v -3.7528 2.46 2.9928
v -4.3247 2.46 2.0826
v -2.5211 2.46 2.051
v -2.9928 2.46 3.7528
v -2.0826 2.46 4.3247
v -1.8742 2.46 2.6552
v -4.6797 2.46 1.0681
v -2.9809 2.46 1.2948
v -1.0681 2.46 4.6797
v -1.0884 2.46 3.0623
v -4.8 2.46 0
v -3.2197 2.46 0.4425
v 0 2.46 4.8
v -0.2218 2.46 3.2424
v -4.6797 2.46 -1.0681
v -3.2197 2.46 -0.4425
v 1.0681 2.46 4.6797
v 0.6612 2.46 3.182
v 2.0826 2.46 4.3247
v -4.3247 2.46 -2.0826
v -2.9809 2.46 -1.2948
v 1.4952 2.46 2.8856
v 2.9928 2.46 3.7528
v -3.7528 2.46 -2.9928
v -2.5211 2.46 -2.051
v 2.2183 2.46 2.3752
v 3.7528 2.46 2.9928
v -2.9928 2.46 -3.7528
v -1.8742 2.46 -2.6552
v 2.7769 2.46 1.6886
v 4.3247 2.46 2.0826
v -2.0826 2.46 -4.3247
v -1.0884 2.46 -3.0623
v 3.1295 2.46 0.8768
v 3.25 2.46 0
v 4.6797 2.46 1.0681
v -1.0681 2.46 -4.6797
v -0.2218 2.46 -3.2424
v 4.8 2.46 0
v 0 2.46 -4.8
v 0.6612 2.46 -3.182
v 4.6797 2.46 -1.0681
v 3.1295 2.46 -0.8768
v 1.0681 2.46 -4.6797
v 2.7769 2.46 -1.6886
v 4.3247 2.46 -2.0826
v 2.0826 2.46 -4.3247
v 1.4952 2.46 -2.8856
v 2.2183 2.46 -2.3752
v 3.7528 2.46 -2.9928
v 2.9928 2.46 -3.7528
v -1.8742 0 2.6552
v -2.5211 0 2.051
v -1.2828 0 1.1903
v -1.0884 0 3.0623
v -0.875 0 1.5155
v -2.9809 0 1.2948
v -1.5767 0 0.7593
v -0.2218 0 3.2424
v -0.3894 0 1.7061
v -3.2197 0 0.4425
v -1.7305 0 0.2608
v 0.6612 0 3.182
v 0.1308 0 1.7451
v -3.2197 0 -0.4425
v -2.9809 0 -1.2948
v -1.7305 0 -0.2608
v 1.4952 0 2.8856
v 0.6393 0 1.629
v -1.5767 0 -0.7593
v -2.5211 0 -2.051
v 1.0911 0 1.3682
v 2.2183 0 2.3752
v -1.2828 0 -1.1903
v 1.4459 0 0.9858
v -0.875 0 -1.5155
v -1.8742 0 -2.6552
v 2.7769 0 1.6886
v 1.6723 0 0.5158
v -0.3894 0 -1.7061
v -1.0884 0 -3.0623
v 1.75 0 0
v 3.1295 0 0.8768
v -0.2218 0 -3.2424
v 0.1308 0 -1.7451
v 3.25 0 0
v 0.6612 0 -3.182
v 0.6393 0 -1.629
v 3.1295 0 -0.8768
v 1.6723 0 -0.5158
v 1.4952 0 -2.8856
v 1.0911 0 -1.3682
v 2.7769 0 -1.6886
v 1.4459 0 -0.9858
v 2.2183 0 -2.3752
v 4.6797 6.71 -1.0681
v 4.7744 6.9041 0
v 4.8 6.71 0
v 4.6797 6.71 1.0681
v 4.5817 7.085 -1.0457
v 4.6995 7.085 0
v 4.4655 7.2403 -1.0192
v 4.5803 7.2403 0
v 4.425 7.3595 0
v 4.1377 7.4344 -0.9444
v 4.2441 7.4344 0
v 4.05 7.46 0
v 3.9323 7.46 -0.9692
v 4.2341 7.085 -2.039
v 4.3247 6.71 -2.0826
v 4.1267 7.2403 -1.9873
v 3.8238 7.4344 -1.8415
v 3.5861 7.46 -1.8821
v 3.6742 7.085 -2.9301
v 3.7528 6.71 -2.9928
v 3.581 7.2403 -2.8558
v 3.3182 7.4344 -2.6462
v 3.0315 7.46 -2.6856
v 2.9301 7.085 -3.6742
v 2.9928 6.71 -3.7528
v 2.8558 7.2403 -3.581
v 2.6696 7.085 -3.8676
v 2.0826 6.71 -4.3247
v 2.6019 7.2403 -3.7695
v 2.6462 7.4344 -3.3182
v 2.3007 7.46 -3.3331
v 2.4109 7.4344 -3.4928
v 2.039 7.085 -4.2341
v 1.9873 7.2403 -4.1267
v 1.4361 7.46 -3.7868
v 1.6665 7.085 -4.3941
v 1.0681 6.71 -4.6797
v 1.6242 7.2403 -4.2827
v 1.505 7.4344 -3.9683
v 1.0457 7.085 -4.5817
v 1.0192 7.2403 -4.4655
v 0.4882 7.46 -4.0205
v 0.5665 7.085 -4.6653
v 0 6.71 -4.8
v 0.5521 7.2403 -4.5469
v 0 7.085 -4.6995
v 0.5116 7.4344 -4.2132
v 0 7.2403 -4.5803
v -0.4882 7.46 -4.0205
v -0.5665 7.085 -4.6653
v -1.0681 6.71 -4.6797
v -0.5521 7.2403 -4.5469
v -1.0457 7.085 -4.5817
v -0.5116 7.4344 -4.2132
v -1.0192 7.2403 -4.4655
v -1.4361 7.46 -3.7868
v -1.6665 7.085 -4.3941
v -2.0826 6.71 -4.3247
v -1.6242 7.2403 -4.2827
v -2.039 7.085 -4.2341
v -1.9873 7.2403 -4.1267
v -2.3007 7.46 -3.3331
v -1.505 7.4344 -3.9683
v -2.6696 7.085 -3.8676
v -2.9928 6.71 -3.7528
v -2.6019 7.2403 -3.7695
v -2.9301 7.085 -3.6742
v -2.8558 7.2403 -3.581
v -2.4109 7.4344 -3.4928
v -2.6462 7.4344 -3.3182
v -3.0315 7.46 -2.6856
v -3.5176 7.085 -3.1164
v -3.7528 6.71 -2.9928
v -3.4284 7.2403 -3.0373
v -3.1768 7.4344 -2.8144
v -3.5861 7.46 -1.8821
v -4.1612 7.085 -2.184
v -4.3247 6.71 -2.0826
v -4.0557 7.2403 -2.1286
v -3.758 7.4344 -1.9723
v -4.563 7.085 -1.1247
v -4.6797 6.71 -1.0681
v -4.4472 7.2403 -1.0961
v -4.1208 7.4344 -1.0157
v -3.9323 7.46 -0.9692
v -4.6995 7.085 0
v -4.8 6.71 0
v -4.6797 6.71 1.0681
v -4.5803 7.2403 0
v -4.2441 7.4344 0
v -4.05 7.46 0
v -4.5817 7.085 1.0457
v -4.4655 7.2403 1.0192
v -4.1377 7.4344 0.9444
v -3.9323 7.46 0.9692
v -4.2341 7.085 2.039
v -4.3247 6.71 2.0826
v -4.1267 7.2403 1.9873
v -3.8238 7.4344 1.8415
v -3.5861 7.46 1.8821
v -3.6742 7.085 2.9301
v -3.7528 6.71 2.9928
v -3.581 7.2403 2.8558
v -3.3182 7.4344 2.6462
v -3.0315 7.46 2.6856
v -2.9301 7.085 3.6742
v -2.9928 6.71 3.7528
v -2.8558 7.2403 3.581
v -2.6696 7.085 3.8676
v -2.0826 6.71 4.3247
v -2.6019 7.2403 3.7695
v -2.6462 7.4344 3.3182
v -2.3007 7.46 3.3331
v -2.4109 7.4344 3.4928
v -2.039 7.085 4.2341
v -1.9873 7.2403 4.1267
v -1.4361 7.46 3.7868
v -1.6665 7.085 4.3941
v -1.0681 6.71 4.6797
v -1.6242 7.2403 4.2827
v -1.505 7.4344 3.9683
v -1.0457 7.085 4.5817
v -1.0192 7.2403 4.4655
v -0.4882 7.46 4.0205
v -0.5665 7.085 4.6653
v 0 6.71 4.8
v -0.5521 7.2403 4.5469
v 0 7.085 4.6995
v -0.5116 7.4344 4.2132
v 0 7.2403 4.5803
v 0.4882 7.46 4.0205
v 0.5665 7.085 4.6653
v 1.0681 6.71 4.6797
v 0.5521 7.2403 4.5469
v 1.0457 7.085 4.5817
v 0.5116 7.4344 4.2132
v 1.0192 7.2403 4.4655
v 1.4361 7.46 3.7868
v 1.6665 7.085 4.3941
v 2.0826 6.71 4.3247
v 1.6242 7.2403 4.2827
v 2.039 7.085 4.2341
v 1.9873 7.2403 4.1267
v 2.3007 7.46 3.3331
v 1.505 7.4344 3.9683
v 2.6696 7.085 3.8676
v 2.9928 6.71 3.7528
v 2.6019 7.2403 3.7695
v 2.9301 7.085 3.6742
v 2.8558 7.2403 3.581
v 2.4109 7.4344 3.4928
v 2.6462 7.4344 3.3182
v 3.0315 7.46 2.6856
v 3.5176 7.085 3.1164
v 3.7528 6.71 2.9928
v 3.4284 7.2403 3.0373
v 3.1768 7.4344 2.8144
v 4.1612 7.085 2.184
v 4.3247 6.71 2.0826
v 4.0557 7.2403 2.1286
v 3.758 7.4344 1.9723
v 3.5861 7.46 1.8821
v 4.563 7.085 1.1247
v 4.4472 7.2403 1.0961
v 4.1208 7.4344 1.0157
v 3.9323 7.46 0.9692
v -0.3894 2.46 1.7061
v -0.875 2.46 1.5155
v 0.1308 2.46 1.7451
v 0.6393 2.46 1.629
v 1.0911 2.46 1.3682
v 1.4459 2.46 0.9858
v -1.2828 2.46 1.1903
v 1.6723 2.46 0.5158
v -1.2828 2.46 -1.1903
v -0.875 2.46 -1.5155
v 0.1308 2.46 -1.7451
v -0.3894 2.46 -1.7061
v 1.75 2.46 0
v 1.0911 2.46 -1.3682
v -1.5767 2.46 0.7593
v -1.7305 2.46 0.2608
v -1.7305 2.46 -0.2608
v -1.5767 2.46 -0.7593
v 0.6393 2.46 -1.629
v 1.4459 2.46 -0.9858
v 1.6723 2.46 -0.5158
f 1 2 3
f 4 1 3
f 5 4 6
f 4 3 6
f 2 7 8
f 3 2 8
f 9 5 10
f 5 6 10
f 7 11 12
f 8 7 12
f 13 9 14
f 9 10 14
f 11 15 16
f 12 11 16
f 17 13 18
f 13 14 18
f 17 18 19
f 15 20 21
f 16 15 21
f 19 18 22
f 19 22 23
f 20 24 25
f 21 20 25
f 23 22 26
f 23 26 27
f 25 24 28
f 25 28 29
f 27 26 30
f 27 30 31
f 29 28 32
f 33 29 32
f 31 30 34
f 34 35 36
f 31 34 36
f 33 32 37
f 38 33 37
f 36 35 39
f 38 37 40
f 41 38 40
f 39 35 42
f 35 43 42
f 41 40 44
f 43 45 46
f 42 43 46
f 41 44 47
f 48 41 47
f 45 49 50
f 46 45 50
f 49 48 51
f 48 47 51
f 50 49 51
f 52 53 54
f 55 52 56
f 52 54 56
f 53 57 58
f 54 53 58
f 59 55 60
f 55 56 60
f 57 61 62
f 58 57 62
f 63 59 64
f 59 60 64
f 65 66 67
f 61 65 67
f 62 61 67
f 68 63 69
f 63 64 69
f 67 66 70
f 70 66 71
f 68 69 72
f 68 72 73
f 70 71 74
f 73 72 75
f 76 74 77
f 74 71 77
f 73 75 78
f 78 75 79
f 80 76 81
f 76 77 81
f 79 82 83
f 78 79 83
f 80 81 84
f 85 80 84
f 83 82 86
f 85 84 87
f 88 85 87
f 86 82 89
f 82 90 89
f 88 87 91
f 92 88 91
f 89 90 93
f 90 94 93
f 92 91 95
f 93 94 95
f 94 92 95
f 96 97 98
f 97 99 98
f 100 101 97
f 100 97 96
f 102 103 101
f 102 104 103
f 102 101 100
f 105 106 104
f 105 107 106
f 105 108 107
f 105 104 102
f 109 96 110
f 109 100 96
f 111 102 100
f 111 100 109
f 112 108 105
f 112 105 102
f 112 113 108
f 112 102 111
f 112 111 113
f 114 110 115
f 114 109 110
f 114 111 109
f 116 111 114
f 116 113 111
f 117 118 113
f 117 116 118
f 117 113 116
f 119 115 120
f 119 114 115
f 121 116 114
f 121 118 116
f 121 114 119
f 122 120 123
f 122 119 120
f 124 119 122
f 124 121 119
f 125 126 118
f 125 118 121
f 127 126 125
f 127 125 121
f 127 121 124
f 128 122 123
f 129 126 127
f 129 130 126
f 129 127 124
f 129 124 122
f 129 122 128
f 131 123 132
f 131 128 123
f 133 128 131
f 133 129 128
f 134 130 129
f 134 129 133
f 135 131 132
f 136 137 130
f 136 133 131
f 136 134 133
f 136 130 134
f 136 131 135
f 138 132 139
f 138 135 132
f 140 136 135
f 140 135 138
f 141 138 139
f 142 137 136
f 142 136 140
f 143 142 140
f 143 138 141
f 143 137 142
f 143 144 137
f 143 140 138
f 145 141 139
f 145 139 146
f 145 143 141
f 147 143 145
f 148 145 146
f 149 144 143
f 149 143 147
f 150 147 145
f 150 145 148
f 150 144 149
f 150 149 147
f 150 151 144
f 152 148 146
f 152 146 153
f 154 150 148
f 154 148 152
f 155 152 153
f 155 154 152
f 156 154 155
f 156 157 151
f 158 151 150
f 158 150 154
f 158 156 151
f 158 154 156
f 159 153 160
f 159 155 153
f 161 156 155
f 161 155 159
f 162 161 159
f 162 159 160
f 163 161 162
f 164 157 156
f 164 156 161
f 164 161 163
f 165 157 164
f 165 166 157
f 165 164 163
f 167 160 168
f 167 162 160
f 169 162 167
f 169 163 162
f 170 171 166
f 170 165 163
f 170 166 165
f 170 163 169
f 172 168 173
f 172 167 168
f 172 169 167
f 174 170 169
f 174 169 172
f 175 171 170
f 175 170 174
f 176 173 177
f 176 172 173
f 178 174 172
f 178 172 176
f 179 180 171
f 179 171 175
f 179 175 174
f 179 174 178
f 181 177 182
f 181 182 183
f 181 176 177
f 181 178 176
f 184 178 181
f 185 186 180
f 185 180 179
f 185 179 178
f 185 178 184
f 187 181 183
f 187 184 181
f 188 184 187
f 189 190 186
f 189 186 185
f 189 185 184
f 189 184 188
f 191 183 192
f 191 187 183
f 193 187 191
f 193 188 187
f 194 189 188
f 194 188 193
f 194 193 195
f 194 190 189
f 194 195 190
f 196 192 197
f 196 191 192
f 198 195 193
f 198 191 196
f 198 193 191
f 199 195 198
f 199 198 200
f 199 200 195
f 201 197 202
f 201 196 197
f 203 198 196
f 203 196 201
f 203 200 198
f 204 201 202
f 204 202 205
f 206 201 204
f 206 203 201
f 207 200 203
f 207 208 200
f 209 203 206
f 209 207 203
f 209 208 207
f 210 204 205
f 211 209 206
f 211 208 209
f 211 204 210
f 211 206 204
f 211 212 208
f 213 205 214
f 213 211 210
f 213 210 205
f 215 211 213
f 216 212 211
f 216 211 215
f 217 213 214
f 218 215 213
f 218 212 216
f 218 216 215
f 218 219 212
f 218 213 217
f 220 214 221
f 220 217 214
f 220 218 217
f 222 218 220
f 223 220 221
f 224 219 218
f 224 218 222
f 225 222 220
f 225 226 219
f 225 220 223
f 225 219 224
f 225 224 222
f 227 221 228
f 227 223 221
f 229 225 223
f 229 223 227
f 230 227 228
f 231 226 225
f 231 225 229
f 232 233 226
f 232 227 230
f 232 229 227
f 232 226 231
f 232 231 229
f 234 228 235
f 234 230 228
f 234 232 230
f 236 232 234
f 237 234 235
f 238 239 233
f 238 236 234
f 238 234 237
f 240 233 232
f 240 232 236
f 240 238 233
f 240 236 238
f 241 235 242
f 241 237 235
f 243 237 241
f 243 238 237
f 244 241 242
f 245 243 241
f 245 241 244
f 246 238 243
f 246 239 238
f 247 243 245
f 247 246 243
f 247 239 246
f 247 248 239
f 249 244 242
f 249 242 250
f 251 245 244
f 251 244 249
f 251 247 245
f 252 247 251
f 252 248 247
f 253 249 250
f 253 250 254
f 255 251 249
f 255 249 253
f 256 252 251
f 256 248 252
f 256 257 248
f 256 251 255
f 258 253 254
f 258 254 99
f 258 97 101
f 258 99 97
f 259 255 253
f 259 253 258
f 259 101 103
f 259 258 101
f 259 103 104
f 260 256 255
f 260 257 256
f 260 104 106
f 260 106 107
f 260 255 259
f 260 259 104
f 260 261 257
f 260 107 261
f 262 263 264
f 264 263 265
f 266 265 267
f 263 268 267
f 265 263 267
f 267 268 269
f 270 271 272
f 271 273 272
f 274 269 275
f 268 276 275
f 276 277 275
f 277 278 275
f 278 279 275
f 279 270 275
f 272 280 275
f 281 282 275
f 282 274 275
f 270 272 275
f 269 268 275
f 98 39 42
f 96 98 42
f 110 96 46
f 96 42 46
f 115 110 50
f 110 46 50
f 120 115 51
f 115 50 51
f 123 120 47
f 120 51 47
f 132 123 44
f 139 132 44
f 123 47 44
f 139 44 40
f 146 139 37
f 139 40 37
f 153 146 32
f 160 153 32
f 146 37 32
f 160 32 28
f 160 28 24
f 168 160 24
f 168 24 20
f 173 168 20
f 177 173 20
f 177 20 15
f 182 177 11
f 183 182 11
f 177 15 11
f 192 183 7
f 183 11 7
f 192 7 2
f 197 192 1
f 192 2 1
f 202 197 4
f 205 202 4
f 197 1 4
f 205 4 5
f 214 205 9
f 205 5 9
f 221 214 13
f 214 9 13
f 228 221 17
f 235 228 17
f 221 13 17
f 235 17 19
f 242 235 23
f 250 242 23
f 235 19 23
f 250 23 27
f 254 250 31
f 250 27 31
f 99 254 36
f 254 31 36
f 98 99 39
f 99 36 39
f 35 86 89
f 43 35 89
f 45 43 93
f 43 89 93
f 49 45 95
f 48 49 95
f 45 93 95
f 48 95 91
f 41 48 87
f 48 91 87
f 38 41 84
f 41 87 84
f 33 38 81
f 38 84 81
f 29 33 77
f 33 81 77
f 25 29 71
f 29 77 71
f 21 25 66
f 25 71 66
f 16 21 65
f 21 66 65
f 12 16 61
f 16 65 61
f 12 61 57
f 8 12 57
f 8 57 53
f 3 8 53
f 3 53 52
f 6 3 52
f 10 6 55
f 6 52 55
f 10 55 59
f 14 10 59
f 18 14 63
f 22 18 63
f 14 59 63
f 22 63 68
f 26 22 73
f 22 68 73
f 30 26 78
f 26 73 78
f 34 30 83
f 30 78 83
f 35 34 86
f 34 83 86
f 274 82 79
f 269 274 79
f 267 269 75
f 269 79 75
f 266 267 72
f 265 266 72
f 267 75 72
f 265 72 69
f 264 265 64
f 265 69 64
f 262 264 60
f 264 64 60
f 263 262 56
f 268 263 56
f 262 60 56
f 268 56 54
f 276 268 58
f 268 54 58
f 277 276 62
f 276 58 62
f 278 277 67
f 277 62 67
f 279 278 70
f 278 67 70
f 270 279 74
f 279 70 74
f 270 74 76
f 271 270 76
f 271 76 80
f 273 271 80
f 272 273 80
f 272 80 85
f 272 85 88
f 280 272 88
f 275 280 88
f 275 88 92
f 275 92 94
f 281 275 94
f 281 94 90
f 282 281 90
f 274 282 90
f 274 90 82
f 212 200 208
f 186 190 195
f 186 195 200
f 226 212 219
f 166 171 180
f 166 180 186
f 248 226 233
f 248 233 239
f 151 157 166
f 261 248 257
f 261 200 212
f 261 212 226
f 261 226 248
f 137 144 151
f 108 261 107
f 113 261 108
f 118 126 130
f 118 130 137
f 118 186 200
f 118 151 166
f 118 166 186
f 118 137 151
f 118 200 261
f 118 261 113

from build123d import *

# Parameters (mm, degrees)
SKETCH1_R           = 3.25
BOSS_EXTRUDE1_DEPTH = 2.46
SKETCH2_R           = 1.75
CUT_EXTRUDE1_DEPTH  = 3.35
SKETCH6_R           = 4.8
BOSS_EXTRUDE2_DEPTH = 5
FILLET1_R           = 0.75


with BuildPart() as part:
    # Sketch1 → Boss-Extrude1 (new body)
    with BuildSketch(Plane(origin=(0, 0, 0), x_dir=(1, 0, 0), z_dir=(0, 1, 0))):
        Circle(SKETCH1_R)
    extrude(amount=BOSS_EXTRUDE1_DEPTH)

    # Sketch2 → Cut-Extrude1 (cut)
    with BuildSketch(Plane.XZ):
        Circle(SKETCH2_R)
    extrude(amount=-CUT_EXTRUDE1_DEPTH, mode=Mode.SUBTRACT)

    # Sketch6 → Boss-Extrude2 (add)
    with BuildSketch(Plane(origin=(0, 2.46, 0), x_dir=(1, 0, 0), z_dir=(0, 1, 0))):
        Circle(SKETCH6_R)
    extrude(amount=BOSS_EXTRUDE2_DEPTH)

    # Fillet1
    fillet1_edges = [part.edges().sort_by_distance(p)[0] for p in [
        (-4.8, 7.46, 0),
    ]]
    fillet(fillet1_edges, radius=FILLET1_R)


solid = part.part
